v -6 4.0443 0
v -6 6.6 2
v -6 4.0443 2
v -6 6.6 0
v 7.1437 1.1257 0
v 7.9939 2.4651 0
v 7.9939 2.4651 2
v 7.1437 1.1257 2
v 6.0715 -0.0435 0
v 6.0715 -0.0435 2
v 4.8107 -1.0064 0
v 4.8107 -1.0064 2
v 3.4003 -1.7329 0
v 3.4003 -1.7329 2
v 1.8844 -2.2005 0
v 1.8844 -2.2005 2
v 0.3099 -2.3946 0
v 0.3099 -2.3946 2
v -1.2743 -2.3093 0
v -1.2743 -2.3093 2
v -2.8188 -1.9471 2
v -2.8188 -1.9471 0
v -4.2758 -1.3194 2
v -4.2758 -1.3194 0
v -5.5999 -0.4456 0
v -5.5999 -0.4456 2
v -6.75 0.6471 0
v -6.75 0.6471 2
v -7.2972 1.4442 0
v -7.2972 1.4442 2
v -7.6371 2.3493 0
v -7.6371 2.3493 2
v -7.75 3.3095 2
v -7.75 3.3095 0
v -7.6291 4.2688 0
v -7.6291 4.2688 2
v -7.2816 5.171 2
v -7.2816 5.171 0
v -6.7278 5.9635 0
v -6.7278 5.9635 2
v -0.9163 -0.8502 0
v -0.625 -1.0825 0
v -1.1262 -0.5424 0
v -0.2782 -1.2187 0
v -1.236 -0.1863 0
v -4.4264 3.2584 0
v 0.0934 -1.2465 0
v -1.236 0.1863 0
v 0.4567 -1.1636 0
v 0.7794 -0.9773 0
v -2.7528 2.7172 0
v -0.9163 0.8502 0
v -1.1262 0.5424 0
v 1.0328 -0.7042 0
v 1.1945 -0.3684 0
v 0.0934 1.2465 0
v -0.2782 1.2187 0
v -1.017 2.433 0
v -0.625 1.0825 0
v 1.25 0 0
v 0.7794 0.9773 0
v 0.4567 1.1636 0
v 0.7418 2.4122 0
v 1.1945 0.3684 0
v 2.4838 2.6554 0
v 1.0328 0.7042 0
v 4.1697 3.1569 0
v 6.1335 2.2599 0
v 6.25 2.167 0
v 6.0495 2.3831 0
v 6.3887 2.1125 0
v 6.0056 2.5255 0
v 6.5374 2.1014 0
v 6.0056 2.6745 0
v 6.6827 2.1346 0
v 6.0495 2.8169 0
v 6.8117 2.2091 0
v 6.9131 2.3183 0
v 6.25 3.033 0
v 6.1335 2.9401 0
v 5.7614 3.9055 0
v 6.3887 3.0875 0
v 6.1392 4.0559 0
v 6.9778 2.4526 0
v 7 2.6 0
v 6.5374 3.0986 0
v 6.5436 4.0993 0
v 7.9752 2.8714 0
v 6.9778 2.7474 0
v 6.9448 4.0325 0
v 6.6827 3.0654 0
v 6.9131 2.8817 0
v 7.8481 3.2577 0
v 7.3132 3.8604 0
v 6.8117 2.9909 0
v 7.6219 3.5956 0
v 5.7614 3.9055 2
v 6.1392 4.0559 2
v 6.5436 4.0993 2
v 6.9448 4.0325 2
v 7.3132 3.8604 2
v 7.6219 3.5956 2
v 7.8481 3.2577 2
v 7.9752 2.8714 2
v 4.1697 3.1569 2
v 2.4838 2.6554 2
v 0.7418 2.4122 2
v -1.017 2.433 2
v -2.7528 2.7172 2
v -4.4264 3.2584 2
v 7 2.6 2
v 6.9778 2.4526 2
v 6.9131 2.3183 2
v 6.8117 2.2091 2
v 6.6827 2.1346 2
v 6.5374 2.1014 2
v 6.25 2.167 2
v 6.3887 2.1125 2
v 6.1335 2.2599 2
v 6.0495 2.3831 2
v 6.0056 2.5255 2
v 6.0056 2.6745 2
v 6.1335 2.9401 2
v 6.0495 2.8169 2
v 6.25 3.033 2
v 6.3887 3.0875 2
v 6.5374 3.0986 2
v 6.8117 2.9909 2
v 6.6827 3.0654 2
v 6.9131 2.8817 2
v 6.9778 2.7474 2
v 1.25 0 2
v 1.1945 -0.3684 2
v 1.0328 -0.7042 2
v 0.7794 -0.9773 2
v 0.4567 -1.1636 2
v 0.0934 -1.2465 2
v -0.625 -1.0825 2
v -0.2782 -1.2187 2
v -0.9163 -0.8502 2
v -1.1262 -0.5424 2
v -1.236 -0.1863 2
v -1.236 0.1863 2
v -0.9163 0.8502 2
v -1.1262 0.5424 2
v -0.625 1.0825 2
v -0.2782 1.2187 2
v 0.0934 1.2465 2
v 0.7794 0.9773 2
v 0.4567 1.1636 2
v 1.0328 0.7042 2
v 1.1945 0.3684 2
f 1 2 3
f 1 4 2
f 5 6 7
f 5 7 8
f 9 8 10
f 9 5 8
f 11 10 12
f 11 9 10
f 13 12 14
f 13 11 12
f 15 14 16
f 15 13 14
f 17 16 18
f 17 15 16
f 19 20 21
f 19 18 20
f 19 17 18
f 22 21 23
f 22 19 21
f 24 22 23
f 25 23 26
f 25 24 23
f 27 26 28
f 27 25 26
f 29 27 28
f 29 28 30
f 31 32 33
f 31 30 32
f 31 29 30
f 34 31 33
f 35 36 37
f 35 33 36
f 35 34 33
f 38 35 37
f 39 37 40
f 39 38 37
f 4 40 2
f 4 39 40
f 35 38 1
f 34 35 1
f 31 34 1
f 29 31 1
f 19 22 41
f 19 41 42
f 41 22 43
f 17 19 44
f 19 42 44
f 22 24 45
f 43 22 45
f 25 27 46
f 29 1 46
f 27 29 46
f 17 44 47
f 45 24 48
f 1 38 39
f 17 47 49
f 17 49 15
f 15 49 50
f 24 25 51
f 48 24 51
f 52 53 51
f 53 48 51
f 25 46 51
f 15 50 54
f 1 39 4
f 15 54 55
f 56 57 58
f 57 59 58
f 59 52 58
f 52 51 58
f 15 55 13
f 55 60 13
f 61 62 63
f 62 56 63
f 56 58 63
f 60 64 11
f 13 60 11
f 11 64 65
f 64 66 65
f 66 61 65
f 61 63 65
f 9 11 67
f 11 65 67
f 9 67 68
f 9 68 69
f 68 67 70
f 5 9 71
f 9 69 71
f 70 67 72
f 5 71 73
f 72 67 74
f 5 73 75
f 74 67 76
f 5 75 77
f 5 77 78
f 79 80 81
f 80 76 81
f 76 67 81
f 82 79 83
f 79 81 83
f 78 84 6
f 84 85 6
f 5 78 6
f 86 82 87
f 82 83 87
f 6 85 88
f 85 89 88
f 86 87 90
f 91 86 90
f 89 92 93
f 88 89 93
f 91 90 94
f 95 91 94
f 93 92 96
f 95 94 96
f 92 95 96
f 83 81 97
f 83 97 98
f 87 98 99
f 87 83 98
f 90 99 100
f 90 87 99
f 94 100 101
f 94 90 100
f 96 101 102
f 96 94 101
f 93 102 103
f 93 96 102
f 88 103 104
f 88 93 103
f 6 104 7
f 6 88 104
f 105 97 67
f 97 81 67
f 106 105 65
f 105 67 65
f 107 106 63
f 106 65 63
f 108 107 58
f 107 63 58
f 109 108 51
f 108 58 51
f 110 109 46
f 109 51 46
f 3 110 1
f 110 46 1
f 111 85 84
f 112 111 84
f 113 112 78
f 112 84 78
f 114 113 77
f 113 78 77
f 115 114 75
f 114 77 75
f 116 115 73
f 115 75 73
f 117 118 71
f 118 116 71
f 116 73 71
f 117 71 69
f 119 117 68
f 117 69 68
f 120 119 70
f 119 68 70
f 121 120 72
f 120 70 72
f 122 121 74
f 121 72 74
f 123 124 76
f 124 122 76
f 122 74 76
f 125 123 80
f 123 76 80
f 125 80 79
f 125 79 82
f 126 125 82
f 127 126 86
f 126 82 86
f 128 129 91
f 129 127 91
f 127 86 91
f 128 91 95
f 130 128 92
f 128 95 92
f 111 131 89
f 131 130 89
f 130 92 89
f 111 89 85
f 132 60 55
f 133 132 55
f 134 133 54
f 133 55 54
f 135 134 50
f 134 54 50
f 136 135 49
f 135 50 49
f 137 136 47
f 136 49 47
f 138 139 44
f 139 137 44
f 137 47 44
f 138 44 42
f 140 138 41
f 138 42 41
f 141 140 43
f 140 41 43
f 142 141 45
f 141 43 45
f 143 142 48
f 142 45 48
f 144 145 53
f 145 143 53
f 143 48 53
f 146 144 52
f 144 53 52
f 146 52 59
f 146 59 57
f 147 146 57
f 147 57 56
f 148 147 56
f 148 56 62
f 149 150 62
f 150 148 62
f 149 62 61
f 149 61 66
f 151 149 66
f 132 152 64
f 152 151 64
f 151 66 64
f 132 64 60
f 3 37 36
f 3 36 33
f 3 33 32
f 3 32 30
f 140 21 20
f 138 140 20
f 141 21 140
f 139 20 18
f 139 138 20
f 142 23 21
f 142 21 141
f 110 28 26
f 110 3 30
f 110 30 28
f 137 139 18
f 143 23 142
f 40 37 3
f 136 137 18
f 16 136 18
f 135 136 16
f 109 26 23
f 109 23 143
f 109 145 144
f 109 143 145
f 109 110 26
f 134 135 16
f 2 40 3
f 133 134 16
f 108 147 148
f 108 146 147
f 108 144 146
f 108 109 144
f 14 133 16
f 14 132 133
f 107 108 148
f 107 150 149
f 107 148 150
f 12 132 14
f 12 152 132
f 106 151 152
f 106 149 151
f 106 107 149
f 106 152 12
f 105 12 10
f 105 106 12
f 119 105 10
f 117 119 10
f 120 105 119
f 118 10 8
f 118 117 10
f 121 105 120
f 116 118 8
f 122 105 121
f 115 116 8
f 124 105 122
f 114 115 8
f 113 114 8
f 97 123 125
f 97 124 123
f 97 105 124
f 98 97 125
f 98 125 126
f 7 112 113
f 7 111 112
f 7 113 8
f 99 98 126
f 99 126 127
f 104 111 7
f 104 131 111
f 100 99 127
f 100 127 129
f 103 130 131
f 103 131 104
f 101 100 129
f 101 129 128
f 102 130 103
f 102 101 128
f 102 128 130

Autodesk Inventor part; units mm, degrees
ref_plane "YZ Plane" through (0, 0, 0) normal (1, 0, 0) x (0, 1, 0)
ref_plane "XZ Plane" through (0, 0, 0) normal (0, 1, 0) x (-1, 0, 0)
ref_plane "XY Plane" through (0, 0, 0) normal (0, 0, 1) x (1, 0, 0)
sketch "Sketch1" plane through (0, 0, 0) normal (0, 0, 1) x (1, 0, 0)
  circle A0 centre (0, 0) radius 1.25
  line L0 (-13.143, 0) -> (13.143, 0) construction
  line L1 (0, 15.5803) -> (0, -15.5803) construction
  circle A1 centre (6.5, 2.6) radius 0.5
  arc A2 (7.9939, 2.4651) -> (5.7614, 3.9055) centre (6.5, 2.6) ccw
  arc A3 (-6, 4.0443) -> (5.7614, 3.9055) centre (0, 14.0887) ccw
  line L2 (-6, 6.6) -> (-6, 4.0443)
  arc A4 (-6.75, 0.6471) -> (7.9939, 2.4651) centre (0, 6.6) ccw
  arc A5 (-6, 6.6) -> (-6.021, 0) centre (-3.75, 3.2928) ccw
  dimension "d0" = 2.6
  dimension "d1" = 6.5
  dimension "d2" = 1.5
  dimension "d3" = 1
  dimension "d4" = 2.5
  dimension "d5" = 11.7
  dimension "d6" = 6
  dimension "d7" = 9
  dimension "d8" = 6.6
  dimension "d10" = 6.6
  dimension "d11" = 4
extrude "Extrusion1" add sketch "Sketch1" along normal blind 2
properties part number "Hudson 1-66"
